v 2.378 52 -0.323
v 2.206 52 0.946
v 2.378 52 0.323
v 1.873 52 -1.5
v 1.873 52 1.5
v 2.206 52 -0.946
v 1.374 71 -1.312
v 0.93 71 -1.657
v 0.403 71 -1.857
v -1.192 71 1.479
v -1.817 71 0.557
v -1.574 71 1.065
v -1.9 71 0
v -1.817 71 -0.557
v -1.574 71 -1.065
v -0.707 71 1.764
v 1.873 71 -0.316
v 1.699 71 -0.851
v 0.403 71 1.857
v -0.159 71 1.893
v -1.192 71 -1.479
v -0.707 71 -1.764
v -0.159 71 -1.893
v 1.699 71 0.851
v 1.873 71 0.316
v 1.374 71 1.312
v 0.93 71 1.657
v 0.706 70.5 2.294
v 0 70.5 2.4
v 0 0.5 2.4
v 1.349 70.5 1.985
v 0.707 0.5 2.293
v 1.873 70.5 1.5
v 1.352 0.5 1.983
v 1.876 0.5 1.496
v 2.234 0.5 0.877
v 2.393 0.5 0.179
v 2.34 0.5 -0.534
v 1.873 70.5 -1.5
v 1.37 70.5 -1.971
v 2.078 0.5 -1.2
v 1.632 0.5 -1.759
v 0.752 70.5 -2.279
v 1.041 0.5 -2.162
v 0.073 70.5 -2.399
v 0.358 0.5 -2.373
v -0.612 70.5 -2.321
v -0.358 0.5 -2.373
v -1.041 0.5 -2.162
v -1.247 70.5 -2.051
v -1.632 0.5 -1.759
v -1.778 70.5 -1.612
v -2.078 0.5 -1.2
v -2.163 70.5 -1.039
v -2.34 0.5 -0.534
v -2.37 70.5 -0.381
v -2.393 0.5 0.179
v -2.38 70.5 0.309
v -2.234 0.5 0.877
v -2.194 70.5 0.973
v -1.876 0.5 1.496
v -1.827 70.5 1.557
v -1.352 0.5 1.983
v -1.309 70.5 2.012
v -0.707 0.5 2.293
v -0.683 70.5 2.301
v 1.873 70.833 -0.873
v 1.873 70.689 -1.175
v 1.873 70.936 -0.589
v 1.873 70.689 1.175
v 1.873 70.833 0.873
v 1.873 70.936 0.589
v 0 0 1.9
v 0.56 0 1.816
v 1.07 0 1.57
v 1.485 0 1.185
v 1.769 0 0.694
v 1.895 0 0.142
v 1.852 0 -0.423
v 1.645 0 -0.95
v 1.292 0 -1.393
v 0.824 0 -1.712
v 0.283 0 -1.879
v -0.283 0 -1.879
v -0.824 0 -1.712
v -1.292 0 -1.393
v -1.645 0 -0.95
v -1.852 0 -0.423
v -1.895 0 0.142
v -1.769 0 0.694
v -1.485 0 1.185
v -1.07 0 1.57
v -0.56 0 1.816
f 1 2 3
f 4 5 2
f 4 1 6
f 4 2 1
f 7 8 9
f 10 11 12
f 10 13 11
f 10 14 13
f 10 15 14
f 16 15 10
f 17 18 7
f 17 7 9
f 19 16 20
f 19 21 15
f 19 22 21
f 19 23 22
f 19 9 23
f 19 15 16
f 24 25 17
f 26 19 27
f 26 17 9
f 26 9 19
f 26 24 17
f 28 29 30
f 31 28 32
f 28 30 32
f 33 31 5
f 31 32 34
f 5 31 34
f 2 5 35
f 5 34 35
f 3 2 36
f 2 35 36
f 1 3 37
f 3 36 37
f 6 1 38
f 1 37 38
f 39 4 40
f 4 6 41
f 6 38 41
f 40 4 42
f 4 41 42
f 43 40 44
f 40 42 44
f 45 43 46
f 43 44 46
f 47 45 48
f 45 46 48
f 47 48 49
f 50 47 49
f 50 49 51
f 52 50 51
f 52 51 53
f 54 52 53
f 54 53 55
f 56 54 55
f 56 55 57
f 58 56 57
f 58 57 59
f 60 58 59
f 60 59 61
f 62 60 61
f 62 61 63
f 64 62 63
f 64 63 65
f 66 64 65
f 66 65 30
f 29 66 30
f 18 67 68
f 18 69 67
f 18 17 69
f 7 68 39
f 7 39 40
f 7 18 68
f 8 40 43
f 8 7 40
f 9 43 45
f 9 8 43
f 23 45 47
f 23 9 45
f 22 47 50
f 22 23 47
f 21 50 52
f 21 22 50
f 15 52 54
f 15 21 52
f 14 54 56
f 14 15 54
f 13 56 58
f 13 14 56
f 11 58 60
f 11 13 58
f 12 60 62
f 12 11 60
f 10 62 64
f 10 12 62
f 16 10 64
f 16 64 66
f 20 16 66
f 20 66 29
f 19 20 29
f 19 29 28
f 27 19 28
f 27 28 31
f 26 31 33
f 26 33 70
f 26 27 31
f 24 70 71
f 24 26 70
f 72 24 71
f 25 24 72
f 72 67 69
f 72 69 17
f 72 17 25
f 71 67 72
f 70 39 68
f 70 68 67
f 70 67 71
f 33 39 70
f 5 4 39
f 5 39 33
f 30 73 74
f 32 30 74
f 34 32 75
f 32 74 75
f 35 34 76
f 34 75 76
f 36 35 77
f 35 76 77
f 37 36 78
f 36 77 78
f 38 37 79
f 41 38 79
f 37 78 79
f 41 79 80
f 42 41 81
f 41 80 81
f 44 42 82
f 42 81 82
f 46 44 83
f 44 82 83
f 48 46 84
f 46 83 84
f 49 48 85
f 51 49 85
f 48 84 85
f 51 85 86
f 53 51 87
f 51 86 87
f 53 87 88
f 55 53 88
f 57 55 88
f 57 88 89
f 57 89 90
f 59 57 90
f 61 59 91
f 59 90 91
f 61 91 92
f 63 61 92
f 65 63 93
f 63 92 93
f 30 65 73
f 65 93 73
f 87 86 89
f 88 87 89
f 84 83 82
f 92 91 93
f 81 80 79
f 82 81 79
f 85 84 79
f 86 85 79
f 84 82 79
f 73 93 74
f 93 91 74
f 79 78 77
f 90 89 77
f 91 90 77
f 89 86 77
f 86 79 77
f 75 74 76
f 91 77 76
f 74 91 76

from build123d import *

# Parameters (mm, degrees)
SKETCH1_R           = 2.4
BOSS_EXTRUDE1_DEPTH = 71
CUT_EXTRUDE1_START  = -19
CUT_EXTRUDE1_DEPTH  = 19
CHAMFER1_SIZE       = 0.5


with BuildPart() as part:
    # Sketch1 → Boss-Extrude1 (new body)
    with BuildSketch(Plane(origin=(0, 0, 0), x_dir=(1, 0, 0), z_dir=(0, 1, 0))):
        Circle(SKETCH1_R)
    extrude(amount=BOSS_EXTRUDE1_DEPTH)

    # Sketch2 → Cut-Extrude1 (cut)
    with BuildSketch(Plane(origin=(0, 71, 0), x_dir=(1, 0, 0), z_dir=(0, 1, 0)).offset(CUT_EXTRUDE1_START)):
        with BuildLine():
            Line((1.8734994, 1.5), (1.8734994, -1.5))
            ThreePointArc((1.8734994, -1.5), (2.4, 0), (1.8734994, 1.5))
        make_face()
    extrude(amount=CUT_EXTRUDE1_DEPTH, mode=Mode.SUBTRACT)

    # Chamfer1
    chamfer1_edges = [part.edges().sort_by_distance(p)[0] for p in [
        (-2.4, 0, 0),
        (-2.4, 71, 0),
    ]]
    chamfer(chamfer1_edges, length=CHAMFER1_SIZE)


solid = part.part
